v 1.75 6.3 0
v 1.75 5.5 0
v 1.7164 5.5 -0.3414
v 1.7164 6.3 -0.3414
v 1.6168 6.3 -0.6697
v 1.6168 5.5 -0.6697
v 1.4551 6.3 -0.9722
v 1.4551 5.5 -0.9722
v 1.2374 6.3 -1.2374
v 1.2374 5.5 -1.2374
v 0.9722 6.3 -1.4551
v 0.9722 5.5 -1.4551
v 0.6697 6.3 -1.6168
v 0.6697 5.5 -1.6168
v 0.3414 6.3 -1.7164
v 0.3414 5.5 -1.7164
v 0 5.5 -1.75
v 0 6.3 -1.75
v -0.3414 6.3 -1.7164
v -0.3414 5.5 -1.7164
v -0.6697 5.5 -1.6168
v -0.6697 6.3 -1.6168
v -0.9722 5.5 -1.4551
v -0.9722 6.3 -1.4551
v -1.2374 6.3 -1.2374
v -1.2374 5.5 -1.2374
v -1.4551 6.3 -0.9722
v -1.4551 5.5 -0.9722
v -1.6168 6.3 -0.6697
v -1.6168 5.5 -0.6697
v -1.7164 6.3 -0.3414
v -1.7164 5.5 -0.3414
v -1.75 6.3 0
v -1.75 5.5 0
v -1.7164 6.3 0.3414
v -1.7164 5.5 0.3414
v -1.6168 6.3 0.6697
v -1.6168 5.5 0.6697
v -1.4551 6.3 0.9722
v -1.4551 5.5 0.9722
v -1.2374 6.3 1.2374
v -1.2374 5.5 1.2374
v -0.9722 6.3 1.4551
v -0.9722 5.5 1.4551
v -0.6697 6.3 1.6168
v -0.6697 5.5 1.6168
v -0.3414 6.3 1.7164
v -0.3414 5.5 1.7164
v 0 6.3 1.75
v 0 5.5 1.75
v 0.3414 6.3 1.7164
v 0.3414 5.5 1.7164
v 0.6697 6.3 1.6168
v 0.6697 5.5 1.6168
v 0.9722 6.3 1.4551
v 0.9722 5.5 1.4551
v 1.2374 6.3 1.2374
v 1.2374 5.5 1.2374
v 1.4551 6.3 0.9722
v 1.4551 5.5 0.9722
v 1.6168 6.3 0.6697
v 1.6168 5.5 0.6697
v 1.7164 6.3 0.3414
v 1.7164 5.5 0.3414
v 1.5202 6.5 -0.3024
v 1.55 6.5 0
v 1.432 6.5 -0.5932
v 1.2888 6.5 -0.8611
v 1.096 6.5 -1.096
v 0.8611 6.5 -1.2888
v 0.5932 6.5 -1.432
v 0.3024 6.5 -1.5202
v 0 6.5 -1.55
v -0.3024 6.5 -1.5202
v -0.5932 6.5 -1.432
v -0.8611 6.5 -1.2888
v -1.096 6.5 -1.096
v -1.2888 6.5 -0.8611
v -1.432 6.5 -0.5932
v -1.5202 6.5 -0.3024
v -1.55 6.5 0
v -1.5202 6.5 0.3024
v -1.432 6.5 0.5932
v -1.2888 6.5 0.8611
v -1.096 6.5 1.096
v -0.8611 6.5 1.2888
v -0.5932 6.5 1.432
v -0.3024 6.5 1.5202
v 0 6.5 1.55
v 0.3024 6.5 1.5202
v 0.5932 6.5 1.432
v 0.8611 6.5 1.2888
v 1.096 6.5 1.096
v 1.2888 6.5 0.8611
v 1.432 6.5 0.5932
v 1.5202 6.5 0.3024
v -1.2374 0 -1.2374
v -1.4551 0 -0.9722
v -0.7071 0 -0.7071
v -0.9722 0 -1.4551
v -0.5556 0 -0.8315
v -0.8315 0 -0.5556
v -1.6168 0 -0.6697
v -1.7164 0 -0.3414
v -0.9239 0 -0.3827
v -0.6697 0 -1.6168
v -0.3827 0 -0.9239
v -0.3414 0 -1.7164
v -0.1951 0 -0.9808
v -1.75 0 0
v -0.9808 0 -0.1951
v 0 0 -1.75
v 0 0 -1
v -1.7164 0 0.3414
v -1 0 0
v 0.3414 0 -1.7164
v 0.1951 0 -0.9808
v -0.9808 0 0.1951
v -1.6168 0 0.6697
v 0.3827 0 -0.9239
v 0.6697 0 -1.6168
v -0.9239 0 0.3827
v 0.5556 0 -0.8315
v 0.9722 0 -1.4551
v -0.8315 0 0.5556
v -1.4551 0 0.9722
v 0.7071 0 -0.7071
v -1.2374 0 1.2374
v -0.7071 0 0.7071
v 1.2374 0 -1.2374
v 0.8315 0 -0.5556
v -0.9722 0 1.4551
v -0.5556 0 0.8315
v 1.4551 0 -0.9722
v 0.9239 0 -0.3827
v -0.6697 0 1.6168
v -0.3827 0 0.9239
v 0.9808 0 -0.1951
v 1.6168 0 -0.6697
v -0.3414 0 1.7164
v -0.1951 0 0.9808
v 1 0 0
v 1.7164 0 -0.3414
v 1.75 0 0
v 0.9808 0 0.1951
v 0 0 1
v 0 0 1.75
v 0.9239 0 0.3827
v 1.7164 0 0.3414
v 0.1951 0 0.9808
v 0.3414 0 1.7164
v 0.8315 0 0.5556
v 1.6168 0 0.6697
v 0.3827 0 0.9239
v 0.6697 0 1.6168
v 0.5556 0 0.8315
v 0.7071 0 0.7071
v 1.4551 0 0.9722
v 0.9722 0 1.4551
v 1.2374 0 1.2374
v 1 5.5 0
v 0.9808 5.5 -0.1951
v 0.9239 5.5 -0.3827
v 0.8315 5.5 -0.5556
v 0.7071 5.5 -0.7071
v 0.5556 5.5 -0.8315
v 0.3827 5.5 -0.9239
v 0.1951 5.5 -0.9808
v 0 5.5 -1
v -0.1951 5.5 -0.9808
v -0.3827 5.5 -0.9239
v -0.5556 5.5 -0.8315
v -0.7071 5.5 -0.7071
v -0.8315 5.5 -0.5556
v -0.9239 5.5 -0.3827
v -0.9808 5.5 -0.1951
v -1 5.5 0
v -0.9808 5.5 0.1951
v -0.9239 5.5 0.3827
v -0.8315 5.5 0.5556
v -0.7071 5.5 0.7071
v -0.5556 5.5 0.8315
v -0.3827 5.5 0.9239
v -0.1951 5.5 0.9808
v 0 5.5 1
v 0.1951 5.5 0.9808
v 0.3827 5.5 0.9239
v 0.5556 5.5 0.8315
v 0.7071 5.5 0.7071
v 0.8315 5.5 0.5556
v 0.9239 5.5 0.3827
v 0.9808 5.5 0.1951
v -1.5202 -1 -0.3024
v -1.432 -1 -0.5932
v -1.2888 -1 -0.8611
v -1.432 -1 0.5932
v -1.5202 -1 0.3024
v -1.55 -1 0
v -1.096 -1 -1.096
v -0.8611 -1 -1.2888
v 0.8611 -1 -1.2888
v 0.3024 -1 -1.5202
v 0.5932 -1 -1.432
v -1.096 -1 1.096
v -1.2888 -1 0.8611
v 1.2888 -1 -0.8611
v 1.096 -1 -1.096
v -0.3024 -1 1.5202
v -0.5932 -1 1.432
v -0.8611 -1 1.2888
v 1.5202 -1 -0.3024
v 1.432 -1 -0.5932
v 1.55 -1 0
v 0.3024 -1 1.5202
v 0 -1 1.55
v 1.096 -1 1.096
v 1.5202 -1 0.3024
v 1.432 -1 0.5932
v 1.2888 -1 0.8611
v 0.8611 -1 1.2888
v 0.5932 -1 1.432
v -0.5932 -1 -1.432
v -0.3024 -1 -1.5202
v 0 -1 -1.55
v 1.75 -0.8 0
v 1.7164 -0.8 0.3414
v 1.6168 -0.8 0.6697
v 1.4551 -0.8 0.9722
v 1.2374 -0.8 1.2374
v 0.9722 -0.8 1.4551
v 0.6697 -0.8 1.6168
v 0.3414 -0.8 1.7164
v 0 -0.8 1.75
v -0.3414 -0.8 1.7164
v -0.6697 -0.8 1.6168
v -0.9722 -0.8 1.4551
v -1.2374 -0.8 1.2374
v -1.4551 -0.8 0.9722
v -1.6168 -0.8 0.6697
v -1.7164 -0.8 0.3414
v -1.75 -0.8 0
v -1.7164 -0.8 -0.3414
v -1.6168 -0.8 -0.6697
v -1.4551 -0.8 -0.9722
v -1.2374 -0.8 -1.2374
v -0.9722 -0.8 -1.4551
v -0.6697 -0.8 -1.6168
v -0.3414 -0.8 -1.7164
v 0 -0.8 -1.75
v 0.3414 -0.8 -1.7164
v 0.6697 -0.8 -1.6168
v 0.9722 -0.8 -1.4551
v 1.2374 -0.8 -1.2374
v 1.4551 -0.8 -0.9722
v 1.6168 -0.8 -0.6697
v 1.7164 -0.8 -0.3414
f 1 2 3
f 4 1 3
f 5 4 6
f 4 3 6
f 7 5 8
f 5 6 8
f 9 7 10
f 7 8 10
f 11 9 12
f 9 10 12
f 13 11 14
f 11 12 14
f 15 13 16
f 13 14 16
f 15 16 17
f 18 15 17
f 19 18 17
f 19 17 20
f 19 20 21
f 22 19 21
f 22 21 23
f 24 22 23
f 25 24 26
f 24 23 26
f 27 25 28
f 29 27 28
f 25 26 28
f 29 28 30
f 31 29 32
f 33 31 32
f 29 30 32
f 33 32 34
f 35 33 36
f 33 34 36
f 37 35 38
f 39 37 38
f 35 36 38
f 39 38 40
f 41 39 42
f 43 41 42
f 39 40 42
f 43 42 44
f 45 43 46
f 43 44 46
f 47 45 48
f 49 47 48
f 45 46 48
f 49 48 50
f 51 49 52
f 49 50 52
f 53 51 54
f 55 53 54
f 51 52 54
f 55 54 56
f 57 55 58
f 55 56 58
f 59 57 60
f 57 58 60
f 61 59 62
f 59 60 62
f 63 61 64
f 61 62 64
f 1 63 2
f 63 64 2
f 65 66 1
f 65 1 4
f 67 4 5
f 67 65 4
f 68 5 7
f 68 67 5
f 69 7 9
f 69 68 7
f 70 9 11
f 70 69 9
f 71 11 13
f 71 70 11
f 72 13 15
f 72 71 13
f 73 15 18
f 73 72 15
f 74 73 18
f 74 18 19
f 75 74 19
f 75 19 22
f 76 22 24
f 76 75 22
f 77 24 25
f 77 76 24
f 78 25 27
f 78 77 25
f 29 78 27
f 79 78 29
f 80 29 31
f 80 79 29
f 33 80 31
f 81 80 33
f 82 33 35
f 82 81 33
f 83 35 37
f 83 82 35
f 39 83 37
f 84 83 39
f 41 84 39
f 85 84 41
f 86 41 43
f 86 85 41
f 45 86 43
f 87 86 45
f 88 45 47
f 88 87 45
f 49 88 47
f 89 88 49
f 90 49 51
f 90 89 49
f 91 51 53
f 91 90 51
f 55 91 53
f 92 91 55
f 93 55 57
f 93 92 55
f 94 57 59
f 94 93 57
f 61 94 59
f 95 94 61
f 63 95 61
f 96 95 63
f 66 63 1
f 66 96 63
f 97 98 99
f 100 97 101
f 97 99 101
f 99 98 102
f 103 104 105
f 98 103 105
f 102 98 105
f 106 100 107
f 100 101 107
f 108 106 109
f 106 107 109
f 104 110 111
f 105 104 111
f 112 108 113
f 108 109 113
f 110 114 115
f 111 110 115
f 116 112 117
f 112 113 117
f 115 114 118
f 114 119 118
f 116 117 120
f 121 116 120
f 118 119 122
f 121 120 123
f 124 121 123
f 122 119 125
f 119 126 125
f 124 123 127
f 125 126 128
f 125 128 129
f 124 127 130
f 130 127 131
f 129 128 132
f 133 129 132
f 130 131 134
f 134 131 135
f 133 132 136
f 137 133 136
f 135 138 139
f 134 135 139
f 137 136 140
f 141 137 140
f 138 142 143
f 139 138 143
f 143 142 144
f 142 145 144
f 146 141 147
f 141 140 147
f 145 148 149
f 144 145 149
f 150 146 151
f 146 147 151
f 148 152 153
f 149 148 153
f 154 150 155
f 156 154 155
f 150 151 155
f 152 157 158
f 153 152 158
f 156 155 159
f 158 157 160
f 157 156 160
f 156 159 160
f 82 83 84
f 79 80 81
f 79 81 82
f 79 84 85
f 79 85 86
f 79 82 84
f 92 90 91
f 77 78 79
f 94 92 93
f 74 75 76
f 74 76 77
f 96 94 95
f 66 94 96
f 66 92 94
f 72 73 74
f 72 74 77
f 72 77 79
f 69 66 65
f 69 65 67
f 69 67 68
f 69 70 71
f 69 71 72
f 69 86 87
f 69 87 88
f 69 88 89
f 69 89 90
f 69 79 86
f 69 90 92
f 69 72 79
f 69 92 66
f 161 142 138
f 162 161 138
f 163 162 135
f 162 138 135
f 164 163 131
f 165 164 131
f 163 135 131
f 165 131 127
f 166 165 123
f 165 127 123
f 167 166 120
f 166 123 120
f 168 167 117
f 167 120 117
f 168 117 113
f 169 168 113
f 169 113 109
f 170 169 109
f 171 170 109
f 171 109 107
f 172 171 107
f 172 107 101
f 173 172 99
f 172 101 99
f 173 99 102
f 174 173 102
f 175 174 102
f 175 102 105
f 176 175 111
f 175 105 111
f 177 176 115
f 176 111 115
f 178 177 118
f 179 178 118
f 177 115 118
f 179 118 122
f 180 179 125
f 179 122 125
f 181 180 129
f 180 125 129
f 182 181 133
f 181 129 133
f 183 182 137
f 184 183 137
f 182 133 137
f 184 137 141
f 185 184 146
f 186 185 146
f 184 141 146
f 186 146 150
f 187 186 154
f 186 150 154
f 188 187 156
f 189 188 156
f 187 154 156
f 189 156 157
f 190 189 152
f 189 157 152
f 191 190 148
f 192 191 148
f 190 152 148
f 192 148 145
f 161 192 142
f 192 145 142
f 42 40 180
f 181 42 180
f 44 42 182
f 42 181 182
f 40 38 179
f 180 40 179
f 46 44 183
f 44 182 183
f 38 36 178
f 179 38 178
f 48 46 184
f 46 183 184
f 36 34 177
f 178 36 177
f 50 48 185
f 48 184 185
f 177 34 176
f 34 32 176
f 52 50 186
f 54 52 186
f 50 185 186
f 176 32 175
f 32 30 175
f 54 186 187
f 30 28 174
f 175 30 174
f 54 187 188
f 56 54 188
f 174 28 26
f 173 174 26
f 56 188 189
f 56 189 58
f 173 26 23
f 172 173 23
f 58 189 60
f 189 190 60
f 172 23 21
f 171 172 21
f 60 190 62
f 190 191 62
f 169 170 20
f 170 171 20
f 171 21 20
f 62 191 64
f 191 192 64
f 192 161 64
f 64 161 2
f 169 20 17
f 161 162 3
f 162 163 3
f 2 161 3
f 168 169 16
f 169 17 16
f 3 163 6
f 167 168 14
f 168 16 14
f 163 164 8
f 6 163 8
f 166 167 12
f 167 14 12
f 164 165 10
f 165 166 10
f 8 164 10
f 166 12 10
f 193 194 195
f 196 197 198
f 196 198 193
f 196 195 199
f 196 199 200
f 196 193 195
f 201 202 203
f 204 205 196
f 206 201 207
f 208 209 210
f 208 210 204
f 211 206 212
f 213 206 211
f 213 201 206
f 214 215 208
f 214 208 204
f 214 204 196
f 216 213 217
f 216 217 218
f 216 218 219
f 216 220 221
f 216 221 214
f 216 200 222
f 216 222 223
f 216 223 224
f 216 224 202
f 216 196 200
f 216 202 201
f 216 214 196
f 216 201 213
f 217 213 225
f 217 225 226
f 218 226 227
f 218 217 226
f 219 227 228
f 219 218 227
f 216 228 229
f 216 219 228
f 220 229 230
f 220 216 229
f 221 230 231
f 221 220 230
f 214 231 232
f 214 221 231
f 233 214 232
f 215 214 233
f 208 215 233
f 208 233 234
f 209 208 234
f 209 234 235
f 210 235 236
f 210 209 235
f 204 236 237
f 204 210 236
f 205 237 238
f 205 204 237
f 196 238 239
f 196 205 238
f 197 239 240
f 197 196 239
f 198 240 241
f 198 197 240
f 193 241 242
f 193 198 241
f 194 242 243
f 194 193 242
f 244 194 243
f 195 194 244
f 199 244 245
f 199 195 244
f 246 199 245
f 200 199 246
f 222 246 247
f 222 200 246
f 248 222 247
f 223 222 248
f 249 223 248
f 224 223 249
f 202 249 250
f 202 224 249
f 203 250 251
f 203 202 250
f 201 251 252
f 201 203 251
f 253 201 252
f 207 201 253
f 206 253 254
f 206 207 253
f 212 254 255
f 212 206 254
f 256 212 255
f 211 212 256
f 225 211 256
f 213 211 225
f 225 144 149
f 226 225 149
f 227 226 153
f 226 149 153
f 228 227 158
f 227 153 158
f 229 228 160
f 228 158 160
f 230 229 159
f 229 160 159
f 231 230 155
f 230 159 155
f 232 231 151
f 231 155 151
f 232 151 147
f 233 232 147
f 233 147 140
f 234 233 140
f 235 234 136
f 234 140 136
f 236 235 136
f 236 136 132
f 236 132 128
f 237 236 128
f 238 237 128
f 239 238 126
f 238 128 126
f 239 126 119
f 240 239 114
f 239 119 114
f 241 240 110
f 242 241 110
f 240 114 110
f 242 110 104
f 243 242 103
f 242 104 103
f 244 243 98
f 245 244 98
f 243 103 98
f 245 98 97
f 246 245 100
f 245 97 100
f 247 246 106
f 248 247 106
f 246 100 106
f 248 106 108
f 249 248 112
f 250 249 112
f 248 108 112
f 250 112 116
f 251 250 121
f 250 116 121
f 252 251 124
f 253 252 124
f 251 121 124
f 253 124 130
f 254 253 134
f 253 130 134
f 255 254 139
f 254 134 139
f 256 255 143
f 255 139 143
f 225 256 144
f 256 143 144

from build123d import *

# Parameters (mm, degrees)
SKETCH1_R           = 1
BOSS_EXTRUDE1_DEPTH = 5.5
SKETCH2_R           = 1.75
BOSS_EXTRUDE2_DEPTH = 1
CHAMFER1_SIZE       = 0.2
SKETCH3_R           = 1.75
BOSS_EXTRUDE3_DEPTH = 1
CHAMFER2_SIZE       = 0.2


with BuildPart() as part:
    # Sketch1 → Boss-Extrude1 (new body)
    with BuildSketch(Plane(origin=(0, 0, 0), x_dir=(1, 0, 0), z_dir=(0, 1, 0))):
        Circle(SKETCH1_R)
    extrude(amount=BOSS_EXTRUDE1_DEPTH)

    # Sketch2 → Boss-Extrude2 (add)
    with BuildSketch(Plane(origin=(0, 5.5, 0), x_dir=(1, 0, 0), z_dir=(0, 1, 0))):
        Circle(SKETCH2_R)
    extrude(amount=BOSS_EXTRUDE2_DEPTH)

    # Chamfer1
    chamfer1_edges = [part.edges().sort_by_distance(p)[0] for p in [
        (-1.75, 6.5, 0),
    ]]
    chamfer(chamfer1_edges, length=CHAMFER1_SIZE)

    # Sketch3 → Boss-Extrude3 (add)
    with BuildSketch(Plane.XZ):
        Circle(SKETCH3_R)
    extrude(amount=BOSS_EXTRUDE3_DEPTH)

    # Chamfer2
    chamfer2_edges = [part.edges().sort_by_distance(p)[0] for p in [
        (-1.75, -1, 0),
    ]]
    chamfer(chamfer2_edges, length=CHAMFER2_SIZE)


solid = part.part
